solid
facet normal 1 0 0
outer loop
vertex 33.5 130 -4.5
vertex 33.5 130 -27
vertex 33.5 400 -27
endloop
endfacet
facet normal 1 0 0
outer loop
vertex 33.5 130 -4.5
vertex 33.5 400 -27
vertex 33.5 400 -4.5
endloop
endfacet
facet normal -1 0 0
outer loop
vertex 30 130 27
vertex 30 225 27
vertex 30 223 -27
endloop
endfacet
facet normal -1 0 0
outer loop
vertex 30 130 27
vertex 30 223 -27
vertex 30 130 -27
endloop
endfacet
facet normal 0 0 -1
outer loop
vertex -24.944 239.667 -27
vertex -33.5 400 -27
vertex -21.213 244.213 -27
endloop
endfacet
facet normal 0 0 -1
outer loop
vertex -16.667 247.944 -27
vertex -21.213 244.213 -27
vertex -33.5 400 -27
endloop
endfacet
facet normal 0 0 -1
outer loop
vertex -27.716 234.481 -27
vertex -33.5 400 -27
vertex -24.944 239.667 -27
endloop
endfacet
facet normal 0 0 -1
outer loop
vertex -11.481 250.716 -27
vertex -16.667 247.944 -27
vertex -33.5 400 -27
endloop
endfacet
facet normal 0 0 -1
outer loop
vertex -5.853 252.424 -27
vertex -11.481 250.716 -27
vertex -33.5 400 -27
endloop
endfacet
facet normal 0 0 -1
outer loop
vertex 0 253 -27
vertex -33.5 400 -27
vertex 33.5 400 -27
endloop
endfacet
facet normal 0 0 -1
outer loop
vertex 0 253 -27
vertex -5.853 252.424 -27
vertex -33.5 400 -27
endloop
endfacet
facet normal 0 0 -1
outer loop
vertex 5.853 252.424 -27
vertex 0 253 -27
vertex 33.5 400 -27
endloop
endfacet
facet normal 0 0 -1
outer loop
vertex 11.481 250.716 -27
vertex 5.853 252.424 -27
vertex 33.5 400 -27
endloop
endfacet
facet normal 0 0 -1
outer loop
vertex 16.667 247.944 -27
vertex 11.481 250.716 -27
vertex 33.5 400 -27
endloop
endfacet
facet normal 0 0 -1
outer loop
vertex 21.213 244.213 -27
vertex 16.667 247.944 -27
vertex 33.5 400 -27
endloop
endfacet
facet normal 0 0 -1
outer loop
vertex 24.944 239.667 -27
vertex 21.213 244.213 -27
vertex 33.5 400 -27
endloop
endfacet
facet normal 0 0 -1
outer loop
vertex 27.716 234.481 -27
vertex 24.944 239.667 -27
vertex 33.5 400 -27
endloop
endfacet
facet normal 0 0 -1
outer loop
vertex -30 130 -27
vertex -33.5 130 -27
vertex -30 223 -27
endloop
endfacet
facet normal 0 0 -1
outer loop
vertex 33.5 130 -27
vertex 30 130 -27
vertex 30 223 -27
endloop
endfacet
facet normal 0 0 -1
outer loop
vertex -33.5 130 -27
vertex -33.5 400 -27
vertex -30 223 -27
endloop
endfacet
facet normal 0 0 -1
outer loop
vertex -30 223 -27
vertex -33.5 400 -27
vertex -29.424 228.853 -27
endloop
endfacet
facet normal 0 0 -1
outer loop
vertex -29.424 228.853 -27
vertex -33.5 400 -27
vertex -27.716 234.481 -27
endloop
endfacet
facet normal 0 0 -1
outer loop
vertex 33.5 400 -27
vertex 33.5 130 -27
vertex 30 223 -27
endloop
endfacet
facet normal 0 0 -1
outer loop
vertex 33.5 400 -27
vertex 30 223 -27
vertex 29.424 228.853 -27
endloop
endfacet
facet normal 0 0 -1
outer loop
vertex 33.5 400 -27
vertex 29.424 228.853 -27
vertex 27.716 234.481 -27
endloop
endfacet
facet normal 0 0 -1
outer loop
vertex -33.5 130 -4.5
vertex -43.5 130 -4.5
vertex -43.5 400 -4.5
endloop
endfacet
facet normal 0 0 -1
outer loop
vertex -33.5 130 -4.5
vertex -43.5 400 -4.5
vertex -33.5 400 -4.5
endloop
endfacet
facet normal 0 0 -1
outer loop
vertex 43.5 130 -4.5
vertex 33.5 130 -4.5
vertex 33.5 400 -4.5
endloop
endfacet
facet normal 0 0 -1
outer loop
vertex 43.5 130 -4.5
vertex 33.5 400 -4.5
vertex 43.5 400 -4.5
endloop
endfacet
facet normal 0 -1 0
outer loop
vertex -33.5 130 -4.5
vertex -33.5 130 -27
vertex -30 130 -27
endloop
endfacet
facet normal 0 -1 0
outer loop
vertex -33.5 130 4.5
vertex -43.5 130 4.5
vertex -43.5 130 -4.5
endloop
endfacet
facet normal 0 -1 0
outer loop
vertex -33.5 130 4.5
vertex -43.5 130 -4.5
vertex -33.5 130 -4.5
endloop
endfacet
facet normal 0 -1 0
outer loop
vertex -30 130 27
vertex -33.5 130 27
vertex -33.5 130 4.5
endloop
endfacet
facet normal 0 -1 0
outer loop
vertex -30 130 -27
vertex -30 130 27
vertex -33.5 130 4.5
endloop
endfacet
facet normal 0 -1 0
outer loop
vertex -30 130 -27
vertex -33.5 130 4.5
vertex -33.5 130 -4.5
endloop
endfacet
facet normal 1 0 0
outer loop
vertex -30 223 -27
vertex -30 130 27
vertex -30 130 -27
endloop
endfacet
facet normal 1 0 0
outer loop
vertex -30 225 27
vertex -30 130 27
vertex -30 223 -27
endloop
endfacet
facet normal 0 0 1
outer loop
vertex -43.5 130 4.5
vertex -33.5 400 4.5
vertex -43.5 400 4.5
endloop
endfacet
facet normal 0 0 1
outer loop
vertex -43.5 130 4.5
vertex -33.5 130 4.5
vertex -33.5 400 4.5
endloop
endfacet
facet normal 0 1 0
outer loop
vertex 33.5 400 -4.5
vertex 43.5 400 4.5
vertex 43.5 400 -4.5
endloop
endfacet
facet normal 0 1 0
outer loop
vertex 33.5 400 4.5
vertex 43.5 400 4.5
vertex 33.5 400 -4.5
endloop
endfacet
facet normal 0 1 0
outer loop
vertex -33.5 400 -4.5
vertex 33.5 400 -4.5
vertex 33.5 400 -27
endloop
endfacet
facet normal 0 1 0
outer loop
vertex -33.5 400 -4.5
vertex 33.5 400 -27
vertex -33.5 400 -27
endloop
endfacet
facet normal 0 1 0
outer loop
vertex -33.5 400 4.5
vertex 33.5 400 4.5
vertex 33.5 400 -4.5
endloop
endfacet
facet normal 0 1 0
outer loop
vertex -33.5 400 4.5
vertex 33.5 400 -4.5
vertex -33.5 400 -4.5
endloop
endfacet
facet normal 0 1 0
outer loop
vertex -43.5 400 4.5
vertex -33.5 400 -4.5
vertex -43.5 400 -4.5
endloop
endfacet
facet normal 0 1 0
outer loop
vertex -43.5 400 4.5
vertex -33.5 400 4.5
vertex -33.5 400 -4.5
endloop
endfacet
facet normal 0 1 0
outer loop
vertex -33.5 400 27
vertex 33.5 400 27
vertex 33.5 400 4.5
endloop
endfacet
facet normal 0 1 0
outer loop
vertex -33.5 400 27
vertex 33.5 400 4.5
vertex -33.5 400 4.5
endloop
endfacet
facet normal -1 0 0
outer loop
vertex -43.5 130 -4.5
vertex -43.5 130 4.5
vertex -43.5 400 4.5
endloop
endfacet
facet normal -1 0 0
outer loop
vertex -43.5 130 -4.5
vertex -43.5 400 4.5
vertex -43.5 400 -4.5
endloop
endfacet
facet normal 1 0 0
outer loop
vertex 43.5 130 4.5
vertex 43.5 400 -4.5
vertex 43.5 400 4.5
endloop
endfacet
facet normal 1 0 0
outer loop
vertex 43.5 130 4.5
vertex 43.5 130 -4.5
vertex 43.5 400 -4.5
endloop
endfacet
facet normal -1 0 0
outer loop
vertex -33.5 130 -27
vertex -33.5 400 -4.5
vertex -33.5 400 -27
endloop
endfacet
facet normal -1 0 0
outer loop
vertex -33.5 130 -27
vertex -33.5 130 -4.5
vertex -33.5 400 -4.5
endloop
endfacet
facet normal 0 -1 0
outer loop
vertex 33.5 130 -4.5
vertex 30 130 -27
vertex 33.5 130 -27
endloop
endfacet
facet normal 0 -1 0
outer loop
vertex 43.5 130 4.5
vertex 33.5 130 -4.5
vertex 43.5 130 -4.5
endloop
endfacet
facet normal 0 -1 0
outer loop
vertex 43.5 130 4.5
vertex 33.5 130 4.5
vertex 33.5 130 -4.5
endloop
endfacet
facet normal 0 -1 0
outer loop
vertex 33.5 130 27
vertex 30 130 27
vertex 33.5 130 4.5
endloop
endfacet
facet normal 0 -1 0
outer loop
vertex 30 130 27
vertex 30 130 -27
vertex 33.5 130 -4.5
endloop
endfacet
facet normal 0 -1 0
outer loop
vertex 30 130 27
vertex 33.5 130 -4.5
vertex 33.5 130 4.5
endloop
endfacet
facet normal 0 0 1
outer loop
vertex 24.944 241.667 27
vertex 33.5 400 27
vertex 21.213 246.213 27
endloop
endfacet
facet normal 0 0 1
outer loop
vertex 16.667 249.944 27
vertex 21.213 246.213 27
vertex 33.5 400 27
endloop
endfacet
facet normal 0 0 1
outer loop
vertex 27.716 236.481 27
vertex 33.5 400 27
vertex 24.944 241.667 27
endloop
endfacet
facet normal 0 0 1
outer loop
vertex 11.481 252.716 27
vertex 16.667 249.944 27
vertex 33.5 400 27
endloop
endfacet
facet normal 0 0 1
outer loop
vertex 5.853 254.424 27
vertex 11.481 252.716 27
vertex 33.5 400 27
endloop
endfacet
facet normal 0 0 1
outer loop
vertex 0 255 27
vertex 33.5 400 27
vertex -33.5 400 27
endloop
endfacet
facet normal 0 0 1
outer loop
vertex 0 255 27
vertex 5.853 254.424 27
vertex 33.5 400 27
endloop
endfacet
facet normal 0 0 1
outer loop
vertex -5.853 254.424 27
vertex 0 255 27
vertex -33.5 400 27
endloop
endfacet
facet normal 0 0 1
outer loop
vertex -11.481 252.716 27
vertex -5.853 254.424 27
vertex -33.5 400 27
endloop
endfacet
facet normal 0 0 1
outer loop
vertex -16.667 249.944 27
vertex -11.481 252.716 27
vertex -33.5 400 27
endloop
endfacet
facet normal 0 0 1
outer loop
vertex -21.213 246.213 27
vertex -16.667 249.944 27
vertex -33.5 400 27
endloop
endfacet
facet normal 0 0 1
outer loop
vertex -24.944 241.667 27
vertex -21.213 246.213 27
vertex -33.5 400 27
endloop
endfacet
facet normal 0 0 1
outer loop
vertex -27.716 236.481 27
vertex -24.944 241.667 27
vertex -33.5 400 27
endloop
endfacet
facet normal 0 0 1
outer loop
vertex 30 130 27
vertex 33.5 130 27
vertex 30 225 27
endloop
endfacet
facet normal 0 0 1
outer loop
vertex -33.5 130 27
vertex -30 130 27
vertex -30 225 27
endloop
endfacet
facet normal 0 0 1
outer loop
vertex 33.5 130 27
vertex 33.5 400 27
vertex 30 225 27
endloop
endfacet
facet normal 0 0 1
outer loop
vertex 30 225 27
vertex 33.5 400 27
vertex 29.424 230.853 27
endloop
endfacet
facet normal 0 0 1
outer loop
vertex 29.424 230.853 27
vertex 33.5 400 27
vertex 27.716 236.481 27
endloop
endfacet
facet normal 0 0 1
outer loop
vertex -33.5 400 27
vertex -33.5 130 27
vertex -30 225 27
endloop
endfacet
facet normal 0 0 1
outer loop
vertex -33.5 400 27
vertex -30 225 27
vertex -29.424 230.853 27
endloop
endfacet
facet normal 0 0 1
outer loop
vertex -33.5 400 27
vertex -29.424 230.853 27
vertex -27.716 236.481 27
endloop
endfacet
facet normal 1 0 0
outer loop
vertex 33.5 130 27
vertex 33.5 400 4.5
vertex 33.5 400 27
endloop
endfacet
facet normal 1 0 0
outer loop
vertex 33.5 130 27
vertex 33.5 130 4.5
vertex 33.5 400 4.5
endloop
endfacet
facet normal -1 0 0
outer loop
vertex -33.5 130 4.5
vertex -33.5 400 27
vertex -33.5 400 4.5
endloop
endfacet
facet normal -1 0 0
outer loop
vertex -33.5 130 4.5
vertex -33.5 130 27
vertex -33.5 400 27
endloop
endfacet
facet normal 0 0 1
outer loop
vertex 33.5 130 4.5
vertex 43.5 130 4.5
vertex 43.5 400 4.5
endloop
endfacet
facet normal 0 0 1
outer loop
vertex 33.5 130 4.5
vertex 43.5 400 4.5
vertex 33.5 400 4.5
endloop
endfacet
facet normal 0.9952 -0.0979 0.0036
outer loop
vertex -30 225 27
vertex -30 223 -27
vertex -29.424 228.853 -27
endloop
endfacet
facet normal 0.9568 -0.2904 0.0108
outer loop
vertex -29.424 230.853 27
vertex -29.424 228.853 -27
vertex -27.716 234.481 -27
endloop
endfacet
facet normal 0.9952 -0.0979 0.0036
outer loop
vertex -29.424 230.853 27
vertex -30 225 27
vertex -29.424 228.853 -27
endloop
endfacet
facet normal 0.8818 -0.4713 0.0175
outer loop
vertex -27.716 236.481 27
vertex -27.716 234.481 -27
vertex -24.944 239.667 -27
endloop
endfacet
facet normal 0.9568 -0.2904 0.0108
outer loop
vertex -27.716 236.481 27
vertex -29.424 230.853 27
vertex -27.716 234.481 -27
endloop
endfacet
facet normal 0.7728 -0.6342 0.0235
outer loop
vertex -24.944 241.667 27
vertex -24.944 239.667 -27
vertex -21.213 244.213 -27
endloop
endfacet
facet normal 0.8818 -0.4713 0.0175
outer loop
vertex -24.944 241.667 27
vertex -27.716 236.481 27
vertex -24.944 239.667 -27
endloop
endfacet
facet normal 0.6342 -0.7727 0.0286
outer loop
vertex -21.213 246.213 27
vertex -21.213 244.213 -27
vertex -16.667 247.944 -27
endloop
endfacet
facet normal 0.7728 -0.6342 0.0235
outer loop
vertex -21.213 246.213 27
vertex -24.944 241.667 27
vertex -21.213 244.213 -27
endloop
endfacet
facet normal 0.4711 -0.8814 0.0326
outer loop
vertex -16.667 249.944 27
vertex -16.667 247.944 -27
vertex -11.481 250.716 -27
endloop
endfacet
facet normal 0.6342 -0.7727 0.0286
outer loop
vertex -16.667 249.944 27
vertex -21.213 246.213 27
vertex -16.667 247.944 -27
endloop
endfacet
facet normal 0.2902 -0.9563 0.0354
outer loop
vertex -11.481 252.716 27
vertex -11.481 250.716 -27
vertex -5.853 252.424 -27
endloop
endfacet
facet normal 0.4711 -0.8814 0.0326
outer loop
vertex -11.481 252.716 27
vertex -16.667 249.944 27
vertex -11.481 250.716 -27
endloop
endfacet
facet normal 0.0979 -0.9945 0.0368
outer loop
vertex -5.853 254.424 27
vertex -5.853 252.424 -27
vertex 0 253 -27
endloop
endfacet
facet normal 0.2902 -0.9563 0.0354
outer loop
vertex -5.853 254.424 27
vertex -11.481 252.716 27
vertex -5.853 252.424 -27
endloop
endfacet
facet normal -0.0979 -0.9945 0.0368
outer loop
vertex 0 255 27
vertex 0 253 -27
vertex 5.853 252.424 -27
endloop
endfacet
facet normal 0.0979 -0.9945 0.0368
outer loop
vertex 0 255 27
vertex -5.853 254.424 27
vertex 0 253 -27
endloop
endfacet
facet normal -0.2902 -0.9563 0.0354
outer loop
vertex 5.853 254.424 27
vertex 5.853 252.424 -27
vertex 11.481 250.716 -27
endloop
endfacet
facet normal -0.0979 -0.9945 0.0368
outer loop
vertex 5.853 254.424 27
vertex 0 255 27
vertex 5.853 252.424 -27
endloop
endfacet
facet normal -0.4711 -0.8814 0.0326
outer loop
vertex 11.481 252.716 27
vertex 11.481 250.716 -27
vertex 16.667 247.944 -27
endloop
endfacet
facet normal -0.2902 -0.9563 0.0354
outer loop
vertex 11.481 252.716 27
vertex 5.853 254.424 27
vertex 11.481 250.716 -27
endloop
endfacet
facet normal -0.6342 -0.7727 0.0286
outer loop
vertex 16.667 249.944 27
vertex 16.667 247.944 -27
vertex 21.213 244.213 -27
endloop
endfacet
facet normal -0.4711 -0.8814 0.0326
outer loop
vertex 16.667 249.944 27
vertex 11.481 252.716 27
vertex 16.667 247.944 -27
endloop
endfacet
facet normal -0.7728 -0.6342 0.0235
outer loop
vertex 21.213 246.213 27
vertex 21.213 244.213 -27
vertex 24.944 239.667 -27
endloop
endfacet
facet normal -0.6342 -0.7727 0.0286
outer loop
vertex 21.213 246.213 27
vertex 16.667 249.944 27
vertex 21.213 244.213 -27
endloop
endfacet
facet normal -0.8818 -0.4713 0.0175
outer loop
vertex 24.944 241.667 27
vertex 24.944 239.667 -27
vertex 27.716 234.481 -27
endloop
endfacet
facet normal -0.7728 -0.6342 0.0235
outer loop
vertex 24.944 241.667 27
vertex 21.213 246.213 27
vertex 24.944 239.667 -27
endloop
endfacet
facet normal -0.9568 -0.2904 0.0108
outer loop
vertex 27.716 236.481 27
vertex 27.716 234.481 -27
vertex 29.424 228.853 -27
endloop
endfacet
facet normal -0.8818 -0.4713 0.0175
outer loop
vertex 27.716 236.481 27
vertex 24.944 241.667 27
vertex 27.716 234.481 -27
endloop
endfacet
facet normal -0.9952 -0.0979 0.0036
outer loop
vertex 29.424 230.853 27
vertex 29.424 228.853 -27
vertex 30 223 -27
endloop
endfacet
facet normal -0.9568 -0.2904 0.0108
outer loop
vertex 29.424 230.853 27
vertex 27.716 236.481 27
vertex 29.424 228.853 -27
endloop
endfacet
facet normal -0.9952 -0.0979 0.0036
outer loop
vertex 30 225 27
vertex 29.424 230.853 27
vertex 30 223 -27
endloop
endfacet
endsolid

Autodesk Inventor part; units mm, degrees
ref_plane "YZ Plane" through (0, 0, 0) normal (1, 0, 0) x (0, 1, 0)
ref_plane "XZ Plane" through (0, 0, 0) normal (0, 1, 0) x (-1, 0, 0)
ref_plane "XY Plane" through (0, 0, 0) normal (0, 0, 1) x (1, 0, 0)
sketch "草圖1" plane through (0, 0, 0) normal (0, 1, 0) x (-1, 0, 0)
  line L0 (-33.5, 27) -> (33.5, 27)
  line L1 (33.5, 27) -> (33.5, -27)
  line L2 (33.5, -27) -> (-33.5, -27)
  line L3 (-33.5, -27) -> (-33.5, 27)
  line L4 (-33.5, 27) -> (33.5, -27) construction
  line L5 (33.5, 27) -> (-33.5, -27) construction
  line L6 (43.5, -4.5) -> (33.5, -4.5)
  line L7 (33.5, -4.5) -> (33.5, 4.5)
  line L8 (33.5, 4.5) -> (43.5, 4.5)
  line L9 (43.5, 4.5) -> (43.5, -4.5)
  line L10 (-33.5, -4.5) -> (-43.5, -4.5)
  line L11 (-43.5, -4.5) -> (-43.5, 4.5)
  line L12 (-43.5, 4.5) -> (-33.5, 4.5)
  line L13 (-33.5, 4.5) -> (-33.5, -4.5)
  point P0 (0, 0)
  point P1 (33.5, 0)
  point P2 (-33.5, 0)
  point P3 (-33.5, 4.5)
  point P4 (-33.5, -4.5)
  dimension "d0" = 67
  dimension "d1" = 54
  dimension "d2" = 9
  dimension "d3" = 10
extrude "擠出1" add sketch "草圖1" along normal blind 400
sketch "草圖2" plane through (-33.5, 0, 27) normal (0, 0, 1) x (1, 0, 0)
  line L0 (0, 0) -> (0, 400) projected
  line L1 (0, 400) -> (67, 400) projected
  line L2 (67, 400) -> (67, 0) projected
  line L3 (67, 0) -> (0, 0) projected
  circle A0 centre (33.5, 199) radius 30
  line L4 (3.5, 199) -> (63.5, 199)
  line L5 (63.5, 199) -> (63.5, -2.327)
  line L6 (63.5, -2.327) -> (3.5, -2.327)
  line L7 (3.5, -2.327) -> (3.5, 199)
  point P0 (33.5, 0)
  point P1 (33.5, 0)
  point P2 (3.5, 199)
  point P3 (3.5, 0)
  point P4 (63.5, 0)
  dimension "d6" = 199
  dimension "d7" = 60
extrude "擠出2" cut sketch "草圖2" against normal through all contours L7 A0 L5 L3 | L4 A0 | A0 L4
sketch "草圖3" plane through (-33.5, 400, 27) normal (0, 0, 1) x (1, 0, 0)
  line L0 (-79.9627, -270) -> (146.9627, -270)
  line L1 (146.9627, -270) -> (146.9627, -400)
  line L2 (146.9627, -400) -> (-79.9627, -400)
  line L3 (-79.9627, -400) -> (-79.9627, -270)
  point P0 (33.5, -400)
  point P1 (33.5, -400)
  dimension "d10" = 130
extrude "擠出3" cut sketch "草圖3" against normal through all
sketch "草圖4" plane through (33.5, 400, -27) normal (0, 0, -1) x (-1, 0, 0)
  arc A0 (63.5, -201) -> (3.5, -201) centre (33.5, -201) ccw construction
  circle A1 centre (33.5, -177) radius 30
  line L0 (63.5, -270) -> (3.5, -270)
  line L1 (3.5, -270) -> (3.5, -177)
  line L2 (3.5, -177) -> (63.5, -177)
  line L3 (63.5, -177) -> (63.5, -270)
  point P0 (33.5, -400)
  point P1 (63.5, -270)
  dimension "d13" = 24
  dimension "d14" = 60
sketch "草圖5" plane through (-33.5, 400, 27) normal (0, 0, 1) x (1, 0, 0)
  circle A0 centre (33.5, -175) radius 30
  arc A1 (63.5, -201) -> (3.5, -201) centre (33.5, -201) ccw projected
  line L0 (63.5, -270) -> (3.5, -270)
  line L1 (3.5, -270) -> (3.5, -175)
  line L2 (3.5, -175) -> (63.5, -175)
  line L3 (63.5, -175) -> (63.5, -270)
  point P0 (33.5, -400)
  point P1 (63.5, -270)
  dimension "d15" = 26
  dimension "d16" = 60
loft "斷面混成1" cut profiles "草圖4", "草圖5"
properties part number "Slider-7"
